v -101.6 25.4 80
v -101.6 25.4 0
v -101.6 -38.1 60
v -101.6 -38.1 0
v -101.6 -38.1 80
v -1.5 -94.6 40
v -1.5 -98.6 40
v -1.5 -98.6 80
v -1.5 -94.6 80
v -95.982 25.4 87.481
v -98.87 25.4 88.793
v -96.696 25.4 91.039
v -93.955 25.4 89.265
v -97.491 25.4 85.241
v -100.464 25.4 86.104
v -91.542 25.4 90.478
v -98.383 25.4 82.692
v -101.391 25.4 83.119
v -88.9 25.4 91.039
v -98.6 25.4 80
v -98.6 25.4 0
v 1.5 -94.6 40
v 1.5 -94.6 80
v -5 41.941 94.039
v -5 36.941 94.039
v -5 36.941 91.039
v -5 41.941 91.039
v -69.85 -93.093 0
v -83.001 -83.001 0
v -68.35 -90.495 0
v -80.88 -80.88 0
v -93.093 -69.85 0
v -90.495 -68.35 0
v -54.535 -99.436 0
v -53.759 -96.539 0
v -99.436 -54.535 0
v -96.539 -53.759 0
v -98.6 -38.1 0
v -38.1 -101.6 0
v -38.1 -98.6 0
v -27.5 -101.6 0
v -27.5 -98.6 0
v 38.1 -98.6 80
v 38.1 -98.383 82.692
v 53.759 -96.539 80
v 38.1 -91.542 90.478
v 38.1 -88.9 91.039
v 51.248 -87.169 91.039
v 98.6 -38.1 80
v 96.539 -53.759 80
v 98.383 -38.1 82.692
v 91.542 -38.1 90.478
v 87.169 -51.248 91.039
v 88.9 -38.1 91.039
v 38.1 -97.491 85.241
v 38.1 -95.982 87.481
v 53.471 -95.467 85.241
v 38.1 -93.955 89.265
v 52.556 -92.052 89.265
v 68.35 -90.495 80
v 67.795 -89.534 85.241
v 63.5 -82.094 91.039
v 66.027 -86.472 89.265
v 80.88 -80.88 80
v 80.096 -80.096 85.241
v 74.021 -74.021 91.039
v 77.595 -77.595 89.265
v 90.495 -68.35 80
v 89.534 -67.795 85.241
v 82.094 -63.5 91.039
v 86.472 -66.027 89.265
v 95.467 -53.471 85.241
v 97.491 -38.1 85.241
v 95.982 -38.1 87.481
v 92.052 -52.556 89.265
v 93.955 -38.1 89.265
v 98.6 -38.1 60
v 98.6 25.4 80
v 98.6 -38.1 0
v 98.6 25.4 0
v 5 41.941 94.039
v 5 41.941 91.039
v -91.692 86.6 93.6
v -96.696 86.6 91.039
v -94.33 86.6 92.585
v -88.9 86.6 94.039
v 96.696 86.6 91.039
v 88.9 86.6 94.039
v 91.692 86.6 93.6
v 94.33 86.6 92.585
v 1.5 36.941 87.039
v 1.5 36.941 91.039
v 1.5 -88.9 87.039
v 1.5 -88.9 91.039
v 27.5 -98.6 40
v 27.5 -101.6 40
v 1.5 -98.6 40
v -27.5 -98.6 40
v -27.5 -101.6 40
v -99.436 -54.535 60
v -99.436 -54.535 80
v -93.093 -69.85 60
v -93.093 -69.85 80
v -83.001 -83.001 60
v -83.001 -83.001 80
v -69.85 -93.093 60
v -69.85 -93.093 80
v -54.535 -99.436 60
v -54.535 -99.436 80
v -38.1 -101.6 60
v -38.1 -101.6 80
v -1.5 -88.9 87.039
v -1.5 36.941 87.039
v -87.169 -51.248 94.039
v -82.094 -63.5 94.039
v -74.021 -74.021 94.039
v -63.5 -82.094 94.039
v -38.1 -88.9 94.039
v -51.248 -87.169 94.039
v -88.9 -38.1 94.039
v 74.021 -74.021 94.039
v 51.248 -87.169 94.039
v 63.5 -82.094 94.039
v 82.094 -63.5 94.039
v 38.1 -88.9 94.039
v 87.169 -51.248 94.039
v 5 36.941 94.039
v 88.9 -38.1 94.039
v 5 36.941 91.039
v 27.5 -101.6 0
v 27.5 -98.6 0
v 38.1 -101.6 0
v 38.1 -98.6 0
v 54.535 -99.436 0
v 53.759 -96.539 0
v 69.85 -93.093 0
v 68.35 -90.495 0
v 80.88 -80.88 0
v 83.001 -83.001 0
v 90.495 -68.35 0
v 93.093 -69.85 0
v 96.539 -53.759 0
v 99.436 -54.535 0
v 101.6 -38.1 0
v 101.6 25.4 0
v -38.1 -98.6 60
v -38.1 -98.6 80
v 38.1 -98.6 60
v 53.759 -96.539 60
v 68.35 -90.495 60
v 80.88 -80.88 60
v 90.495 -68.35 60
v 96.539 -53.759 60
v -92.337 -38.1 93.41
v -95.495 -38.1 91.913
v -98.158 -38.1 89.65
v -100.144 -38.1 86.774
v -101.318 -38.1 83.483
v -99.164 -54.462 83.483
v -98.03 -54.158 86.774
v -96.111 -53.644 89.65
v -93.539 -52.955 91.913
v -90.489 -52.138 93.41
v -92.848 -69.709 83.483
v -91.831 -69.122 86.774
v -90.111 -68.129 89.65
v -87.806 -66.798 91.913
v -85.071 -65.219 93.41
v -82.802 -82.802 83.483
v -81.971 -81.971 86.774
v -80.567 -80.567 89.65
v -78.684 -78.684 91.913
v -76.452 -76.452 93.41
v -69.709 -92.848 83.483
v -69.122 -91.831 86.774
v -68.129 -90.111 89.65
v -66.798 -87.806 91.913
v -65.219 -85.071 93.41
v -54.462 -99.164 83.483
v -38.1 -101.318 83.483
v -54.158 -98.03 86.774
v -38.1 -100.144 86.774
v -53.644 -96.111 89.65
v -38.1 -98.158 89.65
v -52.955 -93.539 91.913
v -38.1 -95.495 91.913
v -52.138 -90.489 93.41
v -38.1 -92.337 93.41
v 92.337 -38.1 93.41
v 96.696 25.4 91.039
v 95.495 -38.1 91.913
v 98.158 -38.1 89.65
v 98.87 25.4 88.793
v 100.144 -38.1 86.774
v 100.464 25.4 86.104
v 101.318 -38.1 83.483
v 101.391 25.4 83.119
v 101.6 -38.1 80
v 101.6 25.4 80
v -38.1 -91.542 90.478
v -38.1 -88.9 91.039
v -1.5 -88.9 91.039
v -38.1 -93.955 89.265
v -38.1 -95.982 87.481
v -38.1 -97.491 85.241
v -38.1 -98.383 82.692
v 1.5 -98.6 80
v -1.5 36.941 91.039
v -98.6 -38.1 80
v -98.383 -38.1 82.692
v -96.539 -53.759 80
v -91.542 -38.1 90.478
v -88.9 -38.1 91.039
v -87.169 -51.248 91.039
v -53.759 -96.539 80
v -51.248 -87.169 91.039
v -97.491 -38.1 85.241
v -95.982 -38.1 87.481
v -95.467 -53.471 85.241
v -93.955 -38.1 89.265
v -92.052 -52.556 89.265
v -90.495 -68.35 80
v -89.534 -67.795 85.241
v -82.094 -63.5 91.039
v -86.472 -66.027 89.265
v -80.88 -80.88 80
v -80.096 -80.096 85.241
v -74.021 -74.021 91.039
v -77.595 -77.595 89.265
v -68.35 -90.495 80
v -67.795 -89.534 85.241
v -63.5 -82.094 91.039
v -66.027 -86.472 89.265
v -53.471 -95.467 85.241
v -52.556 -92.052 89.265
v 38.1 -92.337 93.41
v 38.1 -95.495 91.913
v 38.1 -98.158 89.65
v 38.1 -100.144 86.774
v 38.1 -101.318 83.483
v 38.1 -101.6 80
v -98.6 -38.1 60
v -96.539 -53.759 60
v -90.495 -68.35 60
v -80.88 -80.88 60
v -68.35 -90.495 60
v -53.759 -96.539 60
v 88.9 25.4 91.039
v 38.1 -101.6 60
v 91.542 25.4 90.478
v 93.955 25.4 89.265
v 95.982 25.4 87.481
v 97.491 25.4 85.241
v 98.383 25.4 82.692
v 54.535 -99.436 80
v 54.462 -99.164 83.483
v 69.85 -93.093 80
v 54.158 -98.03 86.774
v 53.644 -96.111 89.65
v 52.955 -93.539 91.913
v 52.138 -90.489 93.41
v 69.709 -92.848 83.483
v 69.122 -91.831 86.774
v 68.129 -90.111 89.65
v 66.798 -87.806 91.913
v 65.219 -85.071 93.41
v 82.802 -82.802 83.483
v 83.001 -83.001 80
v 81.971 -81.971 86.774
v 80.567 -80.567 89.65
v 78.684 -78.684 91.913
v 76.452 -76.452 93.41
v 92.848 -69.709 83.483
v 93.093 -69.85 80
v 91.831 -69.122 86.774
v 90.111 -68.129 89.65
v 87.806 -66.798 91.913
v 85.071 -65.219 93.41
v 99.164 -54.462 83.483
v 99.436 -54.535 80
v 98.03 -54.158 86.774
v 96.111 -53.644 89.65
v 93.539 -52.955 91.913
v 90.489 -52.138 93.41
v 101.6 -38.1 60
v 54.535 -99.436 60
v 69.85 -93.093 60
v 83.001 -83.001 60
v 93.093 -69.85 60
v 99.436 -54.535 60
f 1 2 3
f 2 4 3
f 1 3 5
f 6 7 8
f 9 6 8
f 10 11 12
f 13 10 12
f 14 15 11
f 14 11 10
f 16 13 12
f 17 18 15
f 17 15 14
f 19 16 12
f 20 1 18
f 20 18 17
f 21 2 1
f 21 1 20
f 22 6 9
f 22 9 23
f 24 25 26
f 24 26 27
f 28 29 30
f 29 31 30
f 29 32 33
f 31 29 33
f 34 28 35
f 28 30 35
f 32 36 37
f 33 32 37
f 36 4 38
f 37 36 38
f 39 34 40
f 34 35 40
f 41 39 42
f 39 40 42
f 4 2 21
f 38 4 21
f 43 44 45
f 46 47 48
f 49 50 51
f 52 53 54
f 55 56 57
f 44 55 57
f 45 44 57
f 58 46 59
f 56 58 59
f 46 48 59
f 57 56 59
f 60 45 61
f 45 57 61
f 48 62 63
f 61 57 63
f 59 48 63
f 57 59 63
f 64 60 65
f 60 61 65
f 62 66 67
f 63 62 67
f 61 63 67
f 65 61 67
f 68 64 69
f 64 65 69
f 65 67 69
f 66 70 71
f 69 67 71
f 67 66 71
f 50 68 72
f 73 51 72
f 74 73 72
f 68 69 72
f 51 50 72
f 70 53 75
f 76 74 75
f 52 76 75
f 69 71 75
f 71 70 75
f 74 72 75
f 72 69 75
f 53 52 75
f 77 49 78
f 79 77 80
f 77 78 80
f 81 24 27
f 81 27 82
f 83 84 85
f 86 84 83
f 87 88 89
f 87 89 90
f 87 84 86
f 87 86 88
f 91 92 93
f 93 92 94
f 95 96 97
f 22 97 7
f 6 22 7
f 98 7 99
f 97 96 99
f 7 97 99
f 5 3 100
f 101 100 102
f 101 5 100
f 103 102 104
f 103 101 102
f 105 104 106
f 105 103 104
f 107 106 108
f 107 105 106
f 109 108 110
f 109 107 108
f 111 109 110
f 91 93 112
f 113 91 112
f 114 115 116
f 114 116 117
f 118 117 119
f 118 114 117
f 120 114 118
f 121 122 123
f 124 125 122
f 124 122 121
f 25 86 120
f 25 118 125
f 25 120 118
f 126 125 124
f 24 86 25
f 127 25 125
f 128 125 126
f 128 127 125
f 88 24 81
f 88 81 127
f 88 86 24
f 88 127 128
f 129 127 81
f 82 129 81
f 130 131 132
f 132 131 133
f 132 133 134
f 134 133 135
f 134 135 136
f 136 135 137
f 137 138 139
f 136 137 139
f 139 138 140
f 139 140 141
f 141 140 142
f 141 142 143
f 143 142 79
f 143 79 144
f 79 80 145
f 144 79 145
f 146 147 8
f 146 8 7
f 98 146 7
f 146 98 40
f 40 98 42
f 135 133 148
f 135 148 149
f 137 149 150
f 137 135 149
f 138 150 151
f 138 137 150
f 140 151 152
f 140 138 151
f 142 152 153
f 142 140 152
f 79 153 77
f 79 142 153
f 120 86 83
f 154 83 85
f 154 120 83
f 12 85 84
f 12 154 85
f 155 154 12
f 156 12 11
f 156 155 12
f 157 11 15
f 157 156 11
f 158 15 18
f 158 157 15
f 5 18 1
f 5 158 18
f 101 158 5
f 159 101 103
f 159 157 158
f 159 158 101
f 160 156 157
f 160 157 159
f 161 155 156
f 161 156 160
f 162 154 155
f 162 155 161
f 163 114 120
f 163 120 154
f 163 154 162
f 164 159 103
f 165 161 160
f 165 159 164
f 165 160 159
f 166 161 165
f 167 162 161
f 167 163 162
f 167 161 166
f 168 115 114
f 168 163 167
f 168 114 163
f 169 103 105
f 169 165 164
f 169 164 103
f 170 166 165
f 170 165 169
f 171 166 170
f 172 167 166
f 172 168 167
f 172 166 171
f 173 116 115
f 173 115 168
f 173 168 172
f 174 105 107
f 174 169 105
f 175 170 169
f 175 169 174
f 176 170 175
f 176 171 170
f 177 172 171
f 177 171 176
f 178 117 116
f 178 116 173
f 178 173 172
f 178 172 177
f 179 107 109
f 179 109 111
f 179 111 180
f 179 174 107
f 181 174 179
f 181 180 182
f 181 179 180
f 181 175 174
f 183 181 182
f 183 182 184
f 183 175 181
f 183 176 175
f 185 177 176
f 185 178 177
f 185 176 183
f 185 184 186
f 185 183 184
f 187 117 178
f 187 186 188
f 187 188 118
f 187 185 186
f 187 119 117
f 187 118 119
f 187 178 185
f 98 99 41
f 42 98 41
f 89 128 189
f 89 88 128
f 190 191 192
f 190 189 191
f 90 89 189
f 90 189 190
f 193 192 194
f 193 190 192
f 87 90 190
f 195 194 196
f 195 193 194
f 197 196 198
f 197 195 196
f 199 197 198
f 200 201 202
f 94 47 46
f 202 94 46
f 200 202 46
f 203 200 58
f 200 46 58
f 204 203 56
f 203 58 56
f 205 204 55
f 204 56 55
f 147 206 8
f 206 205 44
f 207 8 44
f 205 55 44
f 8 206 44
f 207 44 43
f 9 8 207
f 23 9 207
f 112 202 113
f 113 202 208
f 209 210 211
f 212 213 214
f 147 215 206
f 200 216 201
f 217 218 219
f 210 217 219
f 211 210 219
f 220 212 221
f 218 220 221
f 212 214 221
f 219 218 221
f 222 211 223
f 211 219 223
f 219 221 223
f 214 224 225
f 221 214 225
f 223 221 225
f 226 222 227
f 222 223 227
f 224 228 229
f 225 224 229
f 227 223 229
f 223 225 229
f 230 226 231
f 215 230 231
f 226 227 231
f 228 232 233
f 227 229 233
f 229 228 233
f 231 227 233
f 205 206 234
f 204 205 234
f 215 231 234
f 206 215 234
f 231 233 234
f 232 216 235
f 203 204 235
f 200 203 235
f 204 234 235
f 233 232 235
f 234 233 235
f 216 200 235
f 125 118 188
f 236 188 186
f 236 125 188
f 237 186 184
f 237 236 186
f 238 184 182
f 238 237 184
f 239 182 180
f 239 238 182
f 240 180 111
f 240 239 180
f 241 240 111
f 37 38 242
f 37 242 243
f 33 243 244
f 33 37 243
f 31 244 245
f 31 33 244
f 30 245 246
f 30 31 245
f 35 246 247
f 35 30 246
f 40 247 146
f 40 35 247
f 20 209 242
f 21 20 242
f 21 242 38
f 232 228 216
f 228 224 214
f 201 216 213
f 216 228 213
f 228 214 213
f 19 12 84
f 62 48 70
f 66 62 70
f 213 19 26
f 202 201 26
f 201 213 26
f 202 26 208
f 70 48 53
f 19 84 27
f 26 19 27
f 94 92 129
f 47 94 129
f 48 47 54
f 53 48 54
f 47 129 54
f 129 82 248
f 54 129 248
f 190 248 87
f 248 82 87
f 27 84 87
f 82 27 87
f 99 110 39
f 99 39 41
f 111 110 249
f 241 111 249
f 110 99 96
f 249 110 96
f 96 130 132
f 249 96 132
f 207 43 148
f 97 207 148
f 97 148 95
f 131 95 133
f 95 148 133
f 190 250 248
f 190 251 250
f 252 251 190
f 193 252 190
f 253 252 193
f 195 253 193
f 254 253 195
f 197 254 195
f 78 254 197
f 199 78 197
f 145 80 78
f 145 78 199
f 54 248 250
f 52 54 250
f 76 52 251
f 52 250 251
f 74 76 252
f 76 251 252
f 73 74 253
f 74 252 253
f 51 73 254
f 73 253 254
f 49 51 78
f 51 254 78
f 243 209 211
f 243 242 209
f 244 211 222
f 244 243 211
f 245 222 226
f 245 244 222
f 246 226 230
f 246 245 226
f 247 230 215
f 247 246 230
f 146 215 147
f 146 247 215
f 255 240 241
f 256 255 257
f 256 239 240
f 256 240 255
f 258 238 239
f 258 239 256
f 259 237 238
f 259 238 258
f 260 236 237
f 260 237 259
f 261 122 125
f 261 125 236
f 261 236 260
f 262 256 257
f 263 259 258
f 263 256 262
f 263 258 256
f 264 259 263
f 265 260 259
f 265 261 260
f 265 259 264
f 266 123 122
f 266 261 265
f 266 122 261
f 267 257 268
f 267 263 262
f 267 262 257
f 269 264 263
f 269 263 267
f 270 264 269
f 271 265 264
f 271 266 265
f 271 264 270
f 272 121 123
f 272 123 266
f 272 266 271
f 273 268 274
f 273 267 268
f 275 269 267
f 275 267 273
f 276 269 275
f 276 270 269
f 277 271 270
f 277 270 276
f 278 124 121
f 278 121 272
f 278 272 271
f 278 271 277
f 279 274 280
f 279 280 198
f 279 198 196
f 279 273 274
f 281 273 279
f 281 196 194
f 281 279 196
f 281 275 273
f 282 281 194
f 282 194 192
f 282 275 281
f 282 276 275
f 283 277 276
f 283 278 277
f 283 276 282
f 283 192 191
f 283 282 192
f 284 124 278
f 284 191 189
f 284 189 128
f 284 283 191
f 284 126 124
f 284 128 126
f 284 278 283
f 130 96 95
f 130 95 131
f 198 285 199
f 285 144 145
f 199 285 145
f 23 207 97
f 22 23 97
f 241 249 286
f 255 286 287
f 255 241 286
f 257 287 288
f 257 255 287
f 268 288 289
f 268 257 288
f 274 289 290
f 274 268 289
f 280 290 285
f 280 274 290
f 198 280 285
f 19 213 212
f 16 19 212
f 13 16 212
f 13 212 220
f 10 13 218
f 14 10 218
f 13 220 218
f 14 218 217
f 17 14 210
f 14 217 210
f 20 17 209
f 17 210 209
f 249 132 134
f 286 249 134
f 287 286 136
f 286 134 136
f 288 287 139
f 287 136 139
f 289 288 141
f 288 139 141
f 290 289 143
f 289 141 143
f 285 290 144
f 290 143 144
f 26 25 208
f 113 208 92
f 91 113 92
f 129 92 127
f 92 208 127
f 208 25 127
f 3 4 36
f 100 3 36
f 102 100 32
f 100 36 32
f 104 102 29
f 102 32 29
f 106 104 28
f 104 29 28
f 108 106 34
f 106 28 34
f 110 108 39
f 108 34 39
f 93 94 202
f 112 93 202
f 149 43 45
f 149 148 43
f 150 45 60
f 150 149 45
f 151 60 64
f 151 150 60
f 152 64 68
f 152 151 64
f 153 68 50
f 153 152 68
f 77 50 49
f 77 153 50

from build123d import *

# Parameters (mm, degrees)
BOSS_EXTRUDE1_DEPTH = 60
SKETCH6_W           = 76.2
SKETCH6_H           = 139.7
BOSS_EXTRUDE3_DEPTH = 3
SKETCH7_W           = 254.695348458
SKETCH7_H           = 135.329086622
CUT_EXTRUDE1_DEPTH  = 76.2
SKETCH8_W           = 10
SKETCH8_H           = 5
CUT_EXTRUDE2_DEPTH  = 95.039099262
SKETCH9_W           = 55
SKETCH9_H           = 40
CUT_EXTRUDE3_DEPTH  = 204.2
SKETCH10_W          = 200.764393162
SKETCH10_H          = 14.388440844
CUT_EXTRUDE4_DEPTH  = 15
BOSS_EXTRUDE4_DEPTH = 4
BOSS_EXTRUDE5_DEPTH = 4


with BuildPart() as part:
    # Sketch1 → Boss-Extrude1 (new body)
    with BuildSketch(Plane.XY):
        with BuildLine():
            Line((-101.6, 101.6), (-101.6, -38.1))
            ThreePointArc((-101.6, -38.1), (-83.001280605, -83.001280605), (-38.1, -101.6))
            Line((-38.1, -101.6), (38.1, -101.6))
            ThreePointArc((38.1, -101.6), (83.001280605, -83.001280605), (101.6, -38.1))
            Line((101.6, -38.1), (101.6, 101.6))
            Line((101.6, 101.6), (-101.6, 101.6))
        make_face()
        with BuildLine():
            Line((-98.6, 98.6), (-98.6, -38.1))
            ThreePointArc((-98.6, -38.1), (-80.879960262, -80.879960262), (-38.1, -98.6))
            Line((-38.1, -98.6), (38.1, -98.6))
            ThreePointArc((38.1, -98.6), (80.879960262, -80.879960262), (98.6, -38.1))
            Line((98.6, -38.1), (98.6, 98.6))
            Line((98.6, 98.6), (-98.6, 98.6))
        make_face(mode=Mode.SUBTRACT)
    extrude(amount=BOSS_EXTRUDE1_DEPTH)

    # Sweep2: sweep along a path in Sketch5
    with BuildLine(Plane.XY.offset(60)) as sweep2_path:
        Line((-100.1, 101.6), (-100.1, -38.1))
        ThreePointArc((-100.1, -38.1), (-81.940620434, -81.940620434), (-38.1, -100.1))
        Line((-38.1, -100.1), (38.1, -100.1))
        ThreePointArc((38.1, -100.1), (81.940620434, -81.940620434), (100.1, -38.1))
        Line((100.1, -38.1), (100.1, 101.6))
    # Sketch3 → Sweep2 (sweep)
    with BuildSketch(Plane(origin=(0, 101.6, 0), x_dir=(1, 0, 0), z_dir=(0, 1, 0))):
        with BuildLine():
            Line((-38.1, -91.039099262), (-88.9, -91.039099262))
            ThreePointArc((-88.9, -91.039099262), (-95.981959893, -87.480761361), (-98.6, -80))
            Line((-98.6, -80), (-98.6, -60))
            Line((-98.6, -60), (-101.6, -60))
            Line((-101.6, -60), (-101.6, -80))
            ThreePointArc((-101.6, -80), (-98.157592659, -89.649805752), (-88.9, -94.039099262))
            Line((-88.9, -94.039099262), (-38.1, -94.039099262))
            Line((-38.1, -94.039099262), (-38.1, -91.039099262))
        make_face()
    sweep(path=sweep2_path.line)

    # Sketch6 → Boss-Extrude3 (add)
    with BuildSketch(Plane.XY.offset(94.039099262)):
        with Locations((0, 31.75)):
            Rectangle(SKETCH6_W, SKETCH6_H)
    extrude(amount=-BOSS_EXTRUDE3_DEPTH)

    # Sketch7 → Cut-Extrude1 (cut)
    with BuildSketch(Plane(origin=(0, 101.6, 0), x_dir=(1, 0, 0), z_dir=(0, 1, 0))):
        with Locations((-4.889183354, -23.374555951)):
            Rectangle(SKETCH7_W, SKETCH7_H)
    extrude(amount=-CUT_EXTRUDE1_DEPTH, mode=Mode.SUBTRACT)

    # Sketch8 → Cut-Extrude2 (cut, through all)
    with BuildSketch(Plane.XY.offset(94.039099262)):
        with Locations((0, 39.440517612)):
            Rectangle(SKETCH8_W, SKETCH8_H)
    extrude(amount=-CUT_EXTRUDE2_DEPTH, mode=Mode.SUBTRACT)

    # Sketch9 → Cut-Extrude3 (cut, through all)
    with BuildSketch(Plane(origin=(0, -101.6, 0), x_dir=(-1, 0, 0), z_dir=(0, -1, 0))):
        with Locations((0, -20)):
            Rectangle(SKETCH9_W, SKETCH9_H)
    extrude(amount=-CUT_EXTRUDE3_DEPTH, mode=Mode.SUBTRACT)

    # Sketch10 → Cut-Extrude4 (cut)
    with BuildSketch(Plane(origin=(0, 101.6, 0), x_dir=(1, 0, 0), z_dir=(0, 1, 0))):
        with Locations((0, -94.039099262)):
            Rectangle(SKETCH10_W, SKETCH10_H)
    extrude(amount=-CUT_EXTRUDE4_DEPTH, mode=Mode.SUBTRACT)

    # Sketch11 → Boss-Extrude4 (add)
    with BuildSketch(Plane(origin=(0, -98.6, 0), x_dir=(1, 0, 0), z_dir=(0, 1, 0))):
        Polygon((0, -80), (1.5, -80), (1.5, -40), (0, -40), (-1.5, -40), (-1.5, -80), align=None)
    extrude(amount=BOSS_EXTRUDE4_DEPTH)

    # Sketch12 → Boss-Extrude5 (add)
    with BuildSketch(Plane(origin=(0, 0, 91.039099262), x_dir=(-1, 0, 0), z_dir=(0, 0, -1))):
        Polygon((-1.5, -88.9), (0, -88.9), (1.5, -88.9), (1.5, 36.940517612), (-1.5, 36.940517612), align=None)
    extrude(amount=BOSS_EXTRUDE5_DEPTH)


solid = part.part
